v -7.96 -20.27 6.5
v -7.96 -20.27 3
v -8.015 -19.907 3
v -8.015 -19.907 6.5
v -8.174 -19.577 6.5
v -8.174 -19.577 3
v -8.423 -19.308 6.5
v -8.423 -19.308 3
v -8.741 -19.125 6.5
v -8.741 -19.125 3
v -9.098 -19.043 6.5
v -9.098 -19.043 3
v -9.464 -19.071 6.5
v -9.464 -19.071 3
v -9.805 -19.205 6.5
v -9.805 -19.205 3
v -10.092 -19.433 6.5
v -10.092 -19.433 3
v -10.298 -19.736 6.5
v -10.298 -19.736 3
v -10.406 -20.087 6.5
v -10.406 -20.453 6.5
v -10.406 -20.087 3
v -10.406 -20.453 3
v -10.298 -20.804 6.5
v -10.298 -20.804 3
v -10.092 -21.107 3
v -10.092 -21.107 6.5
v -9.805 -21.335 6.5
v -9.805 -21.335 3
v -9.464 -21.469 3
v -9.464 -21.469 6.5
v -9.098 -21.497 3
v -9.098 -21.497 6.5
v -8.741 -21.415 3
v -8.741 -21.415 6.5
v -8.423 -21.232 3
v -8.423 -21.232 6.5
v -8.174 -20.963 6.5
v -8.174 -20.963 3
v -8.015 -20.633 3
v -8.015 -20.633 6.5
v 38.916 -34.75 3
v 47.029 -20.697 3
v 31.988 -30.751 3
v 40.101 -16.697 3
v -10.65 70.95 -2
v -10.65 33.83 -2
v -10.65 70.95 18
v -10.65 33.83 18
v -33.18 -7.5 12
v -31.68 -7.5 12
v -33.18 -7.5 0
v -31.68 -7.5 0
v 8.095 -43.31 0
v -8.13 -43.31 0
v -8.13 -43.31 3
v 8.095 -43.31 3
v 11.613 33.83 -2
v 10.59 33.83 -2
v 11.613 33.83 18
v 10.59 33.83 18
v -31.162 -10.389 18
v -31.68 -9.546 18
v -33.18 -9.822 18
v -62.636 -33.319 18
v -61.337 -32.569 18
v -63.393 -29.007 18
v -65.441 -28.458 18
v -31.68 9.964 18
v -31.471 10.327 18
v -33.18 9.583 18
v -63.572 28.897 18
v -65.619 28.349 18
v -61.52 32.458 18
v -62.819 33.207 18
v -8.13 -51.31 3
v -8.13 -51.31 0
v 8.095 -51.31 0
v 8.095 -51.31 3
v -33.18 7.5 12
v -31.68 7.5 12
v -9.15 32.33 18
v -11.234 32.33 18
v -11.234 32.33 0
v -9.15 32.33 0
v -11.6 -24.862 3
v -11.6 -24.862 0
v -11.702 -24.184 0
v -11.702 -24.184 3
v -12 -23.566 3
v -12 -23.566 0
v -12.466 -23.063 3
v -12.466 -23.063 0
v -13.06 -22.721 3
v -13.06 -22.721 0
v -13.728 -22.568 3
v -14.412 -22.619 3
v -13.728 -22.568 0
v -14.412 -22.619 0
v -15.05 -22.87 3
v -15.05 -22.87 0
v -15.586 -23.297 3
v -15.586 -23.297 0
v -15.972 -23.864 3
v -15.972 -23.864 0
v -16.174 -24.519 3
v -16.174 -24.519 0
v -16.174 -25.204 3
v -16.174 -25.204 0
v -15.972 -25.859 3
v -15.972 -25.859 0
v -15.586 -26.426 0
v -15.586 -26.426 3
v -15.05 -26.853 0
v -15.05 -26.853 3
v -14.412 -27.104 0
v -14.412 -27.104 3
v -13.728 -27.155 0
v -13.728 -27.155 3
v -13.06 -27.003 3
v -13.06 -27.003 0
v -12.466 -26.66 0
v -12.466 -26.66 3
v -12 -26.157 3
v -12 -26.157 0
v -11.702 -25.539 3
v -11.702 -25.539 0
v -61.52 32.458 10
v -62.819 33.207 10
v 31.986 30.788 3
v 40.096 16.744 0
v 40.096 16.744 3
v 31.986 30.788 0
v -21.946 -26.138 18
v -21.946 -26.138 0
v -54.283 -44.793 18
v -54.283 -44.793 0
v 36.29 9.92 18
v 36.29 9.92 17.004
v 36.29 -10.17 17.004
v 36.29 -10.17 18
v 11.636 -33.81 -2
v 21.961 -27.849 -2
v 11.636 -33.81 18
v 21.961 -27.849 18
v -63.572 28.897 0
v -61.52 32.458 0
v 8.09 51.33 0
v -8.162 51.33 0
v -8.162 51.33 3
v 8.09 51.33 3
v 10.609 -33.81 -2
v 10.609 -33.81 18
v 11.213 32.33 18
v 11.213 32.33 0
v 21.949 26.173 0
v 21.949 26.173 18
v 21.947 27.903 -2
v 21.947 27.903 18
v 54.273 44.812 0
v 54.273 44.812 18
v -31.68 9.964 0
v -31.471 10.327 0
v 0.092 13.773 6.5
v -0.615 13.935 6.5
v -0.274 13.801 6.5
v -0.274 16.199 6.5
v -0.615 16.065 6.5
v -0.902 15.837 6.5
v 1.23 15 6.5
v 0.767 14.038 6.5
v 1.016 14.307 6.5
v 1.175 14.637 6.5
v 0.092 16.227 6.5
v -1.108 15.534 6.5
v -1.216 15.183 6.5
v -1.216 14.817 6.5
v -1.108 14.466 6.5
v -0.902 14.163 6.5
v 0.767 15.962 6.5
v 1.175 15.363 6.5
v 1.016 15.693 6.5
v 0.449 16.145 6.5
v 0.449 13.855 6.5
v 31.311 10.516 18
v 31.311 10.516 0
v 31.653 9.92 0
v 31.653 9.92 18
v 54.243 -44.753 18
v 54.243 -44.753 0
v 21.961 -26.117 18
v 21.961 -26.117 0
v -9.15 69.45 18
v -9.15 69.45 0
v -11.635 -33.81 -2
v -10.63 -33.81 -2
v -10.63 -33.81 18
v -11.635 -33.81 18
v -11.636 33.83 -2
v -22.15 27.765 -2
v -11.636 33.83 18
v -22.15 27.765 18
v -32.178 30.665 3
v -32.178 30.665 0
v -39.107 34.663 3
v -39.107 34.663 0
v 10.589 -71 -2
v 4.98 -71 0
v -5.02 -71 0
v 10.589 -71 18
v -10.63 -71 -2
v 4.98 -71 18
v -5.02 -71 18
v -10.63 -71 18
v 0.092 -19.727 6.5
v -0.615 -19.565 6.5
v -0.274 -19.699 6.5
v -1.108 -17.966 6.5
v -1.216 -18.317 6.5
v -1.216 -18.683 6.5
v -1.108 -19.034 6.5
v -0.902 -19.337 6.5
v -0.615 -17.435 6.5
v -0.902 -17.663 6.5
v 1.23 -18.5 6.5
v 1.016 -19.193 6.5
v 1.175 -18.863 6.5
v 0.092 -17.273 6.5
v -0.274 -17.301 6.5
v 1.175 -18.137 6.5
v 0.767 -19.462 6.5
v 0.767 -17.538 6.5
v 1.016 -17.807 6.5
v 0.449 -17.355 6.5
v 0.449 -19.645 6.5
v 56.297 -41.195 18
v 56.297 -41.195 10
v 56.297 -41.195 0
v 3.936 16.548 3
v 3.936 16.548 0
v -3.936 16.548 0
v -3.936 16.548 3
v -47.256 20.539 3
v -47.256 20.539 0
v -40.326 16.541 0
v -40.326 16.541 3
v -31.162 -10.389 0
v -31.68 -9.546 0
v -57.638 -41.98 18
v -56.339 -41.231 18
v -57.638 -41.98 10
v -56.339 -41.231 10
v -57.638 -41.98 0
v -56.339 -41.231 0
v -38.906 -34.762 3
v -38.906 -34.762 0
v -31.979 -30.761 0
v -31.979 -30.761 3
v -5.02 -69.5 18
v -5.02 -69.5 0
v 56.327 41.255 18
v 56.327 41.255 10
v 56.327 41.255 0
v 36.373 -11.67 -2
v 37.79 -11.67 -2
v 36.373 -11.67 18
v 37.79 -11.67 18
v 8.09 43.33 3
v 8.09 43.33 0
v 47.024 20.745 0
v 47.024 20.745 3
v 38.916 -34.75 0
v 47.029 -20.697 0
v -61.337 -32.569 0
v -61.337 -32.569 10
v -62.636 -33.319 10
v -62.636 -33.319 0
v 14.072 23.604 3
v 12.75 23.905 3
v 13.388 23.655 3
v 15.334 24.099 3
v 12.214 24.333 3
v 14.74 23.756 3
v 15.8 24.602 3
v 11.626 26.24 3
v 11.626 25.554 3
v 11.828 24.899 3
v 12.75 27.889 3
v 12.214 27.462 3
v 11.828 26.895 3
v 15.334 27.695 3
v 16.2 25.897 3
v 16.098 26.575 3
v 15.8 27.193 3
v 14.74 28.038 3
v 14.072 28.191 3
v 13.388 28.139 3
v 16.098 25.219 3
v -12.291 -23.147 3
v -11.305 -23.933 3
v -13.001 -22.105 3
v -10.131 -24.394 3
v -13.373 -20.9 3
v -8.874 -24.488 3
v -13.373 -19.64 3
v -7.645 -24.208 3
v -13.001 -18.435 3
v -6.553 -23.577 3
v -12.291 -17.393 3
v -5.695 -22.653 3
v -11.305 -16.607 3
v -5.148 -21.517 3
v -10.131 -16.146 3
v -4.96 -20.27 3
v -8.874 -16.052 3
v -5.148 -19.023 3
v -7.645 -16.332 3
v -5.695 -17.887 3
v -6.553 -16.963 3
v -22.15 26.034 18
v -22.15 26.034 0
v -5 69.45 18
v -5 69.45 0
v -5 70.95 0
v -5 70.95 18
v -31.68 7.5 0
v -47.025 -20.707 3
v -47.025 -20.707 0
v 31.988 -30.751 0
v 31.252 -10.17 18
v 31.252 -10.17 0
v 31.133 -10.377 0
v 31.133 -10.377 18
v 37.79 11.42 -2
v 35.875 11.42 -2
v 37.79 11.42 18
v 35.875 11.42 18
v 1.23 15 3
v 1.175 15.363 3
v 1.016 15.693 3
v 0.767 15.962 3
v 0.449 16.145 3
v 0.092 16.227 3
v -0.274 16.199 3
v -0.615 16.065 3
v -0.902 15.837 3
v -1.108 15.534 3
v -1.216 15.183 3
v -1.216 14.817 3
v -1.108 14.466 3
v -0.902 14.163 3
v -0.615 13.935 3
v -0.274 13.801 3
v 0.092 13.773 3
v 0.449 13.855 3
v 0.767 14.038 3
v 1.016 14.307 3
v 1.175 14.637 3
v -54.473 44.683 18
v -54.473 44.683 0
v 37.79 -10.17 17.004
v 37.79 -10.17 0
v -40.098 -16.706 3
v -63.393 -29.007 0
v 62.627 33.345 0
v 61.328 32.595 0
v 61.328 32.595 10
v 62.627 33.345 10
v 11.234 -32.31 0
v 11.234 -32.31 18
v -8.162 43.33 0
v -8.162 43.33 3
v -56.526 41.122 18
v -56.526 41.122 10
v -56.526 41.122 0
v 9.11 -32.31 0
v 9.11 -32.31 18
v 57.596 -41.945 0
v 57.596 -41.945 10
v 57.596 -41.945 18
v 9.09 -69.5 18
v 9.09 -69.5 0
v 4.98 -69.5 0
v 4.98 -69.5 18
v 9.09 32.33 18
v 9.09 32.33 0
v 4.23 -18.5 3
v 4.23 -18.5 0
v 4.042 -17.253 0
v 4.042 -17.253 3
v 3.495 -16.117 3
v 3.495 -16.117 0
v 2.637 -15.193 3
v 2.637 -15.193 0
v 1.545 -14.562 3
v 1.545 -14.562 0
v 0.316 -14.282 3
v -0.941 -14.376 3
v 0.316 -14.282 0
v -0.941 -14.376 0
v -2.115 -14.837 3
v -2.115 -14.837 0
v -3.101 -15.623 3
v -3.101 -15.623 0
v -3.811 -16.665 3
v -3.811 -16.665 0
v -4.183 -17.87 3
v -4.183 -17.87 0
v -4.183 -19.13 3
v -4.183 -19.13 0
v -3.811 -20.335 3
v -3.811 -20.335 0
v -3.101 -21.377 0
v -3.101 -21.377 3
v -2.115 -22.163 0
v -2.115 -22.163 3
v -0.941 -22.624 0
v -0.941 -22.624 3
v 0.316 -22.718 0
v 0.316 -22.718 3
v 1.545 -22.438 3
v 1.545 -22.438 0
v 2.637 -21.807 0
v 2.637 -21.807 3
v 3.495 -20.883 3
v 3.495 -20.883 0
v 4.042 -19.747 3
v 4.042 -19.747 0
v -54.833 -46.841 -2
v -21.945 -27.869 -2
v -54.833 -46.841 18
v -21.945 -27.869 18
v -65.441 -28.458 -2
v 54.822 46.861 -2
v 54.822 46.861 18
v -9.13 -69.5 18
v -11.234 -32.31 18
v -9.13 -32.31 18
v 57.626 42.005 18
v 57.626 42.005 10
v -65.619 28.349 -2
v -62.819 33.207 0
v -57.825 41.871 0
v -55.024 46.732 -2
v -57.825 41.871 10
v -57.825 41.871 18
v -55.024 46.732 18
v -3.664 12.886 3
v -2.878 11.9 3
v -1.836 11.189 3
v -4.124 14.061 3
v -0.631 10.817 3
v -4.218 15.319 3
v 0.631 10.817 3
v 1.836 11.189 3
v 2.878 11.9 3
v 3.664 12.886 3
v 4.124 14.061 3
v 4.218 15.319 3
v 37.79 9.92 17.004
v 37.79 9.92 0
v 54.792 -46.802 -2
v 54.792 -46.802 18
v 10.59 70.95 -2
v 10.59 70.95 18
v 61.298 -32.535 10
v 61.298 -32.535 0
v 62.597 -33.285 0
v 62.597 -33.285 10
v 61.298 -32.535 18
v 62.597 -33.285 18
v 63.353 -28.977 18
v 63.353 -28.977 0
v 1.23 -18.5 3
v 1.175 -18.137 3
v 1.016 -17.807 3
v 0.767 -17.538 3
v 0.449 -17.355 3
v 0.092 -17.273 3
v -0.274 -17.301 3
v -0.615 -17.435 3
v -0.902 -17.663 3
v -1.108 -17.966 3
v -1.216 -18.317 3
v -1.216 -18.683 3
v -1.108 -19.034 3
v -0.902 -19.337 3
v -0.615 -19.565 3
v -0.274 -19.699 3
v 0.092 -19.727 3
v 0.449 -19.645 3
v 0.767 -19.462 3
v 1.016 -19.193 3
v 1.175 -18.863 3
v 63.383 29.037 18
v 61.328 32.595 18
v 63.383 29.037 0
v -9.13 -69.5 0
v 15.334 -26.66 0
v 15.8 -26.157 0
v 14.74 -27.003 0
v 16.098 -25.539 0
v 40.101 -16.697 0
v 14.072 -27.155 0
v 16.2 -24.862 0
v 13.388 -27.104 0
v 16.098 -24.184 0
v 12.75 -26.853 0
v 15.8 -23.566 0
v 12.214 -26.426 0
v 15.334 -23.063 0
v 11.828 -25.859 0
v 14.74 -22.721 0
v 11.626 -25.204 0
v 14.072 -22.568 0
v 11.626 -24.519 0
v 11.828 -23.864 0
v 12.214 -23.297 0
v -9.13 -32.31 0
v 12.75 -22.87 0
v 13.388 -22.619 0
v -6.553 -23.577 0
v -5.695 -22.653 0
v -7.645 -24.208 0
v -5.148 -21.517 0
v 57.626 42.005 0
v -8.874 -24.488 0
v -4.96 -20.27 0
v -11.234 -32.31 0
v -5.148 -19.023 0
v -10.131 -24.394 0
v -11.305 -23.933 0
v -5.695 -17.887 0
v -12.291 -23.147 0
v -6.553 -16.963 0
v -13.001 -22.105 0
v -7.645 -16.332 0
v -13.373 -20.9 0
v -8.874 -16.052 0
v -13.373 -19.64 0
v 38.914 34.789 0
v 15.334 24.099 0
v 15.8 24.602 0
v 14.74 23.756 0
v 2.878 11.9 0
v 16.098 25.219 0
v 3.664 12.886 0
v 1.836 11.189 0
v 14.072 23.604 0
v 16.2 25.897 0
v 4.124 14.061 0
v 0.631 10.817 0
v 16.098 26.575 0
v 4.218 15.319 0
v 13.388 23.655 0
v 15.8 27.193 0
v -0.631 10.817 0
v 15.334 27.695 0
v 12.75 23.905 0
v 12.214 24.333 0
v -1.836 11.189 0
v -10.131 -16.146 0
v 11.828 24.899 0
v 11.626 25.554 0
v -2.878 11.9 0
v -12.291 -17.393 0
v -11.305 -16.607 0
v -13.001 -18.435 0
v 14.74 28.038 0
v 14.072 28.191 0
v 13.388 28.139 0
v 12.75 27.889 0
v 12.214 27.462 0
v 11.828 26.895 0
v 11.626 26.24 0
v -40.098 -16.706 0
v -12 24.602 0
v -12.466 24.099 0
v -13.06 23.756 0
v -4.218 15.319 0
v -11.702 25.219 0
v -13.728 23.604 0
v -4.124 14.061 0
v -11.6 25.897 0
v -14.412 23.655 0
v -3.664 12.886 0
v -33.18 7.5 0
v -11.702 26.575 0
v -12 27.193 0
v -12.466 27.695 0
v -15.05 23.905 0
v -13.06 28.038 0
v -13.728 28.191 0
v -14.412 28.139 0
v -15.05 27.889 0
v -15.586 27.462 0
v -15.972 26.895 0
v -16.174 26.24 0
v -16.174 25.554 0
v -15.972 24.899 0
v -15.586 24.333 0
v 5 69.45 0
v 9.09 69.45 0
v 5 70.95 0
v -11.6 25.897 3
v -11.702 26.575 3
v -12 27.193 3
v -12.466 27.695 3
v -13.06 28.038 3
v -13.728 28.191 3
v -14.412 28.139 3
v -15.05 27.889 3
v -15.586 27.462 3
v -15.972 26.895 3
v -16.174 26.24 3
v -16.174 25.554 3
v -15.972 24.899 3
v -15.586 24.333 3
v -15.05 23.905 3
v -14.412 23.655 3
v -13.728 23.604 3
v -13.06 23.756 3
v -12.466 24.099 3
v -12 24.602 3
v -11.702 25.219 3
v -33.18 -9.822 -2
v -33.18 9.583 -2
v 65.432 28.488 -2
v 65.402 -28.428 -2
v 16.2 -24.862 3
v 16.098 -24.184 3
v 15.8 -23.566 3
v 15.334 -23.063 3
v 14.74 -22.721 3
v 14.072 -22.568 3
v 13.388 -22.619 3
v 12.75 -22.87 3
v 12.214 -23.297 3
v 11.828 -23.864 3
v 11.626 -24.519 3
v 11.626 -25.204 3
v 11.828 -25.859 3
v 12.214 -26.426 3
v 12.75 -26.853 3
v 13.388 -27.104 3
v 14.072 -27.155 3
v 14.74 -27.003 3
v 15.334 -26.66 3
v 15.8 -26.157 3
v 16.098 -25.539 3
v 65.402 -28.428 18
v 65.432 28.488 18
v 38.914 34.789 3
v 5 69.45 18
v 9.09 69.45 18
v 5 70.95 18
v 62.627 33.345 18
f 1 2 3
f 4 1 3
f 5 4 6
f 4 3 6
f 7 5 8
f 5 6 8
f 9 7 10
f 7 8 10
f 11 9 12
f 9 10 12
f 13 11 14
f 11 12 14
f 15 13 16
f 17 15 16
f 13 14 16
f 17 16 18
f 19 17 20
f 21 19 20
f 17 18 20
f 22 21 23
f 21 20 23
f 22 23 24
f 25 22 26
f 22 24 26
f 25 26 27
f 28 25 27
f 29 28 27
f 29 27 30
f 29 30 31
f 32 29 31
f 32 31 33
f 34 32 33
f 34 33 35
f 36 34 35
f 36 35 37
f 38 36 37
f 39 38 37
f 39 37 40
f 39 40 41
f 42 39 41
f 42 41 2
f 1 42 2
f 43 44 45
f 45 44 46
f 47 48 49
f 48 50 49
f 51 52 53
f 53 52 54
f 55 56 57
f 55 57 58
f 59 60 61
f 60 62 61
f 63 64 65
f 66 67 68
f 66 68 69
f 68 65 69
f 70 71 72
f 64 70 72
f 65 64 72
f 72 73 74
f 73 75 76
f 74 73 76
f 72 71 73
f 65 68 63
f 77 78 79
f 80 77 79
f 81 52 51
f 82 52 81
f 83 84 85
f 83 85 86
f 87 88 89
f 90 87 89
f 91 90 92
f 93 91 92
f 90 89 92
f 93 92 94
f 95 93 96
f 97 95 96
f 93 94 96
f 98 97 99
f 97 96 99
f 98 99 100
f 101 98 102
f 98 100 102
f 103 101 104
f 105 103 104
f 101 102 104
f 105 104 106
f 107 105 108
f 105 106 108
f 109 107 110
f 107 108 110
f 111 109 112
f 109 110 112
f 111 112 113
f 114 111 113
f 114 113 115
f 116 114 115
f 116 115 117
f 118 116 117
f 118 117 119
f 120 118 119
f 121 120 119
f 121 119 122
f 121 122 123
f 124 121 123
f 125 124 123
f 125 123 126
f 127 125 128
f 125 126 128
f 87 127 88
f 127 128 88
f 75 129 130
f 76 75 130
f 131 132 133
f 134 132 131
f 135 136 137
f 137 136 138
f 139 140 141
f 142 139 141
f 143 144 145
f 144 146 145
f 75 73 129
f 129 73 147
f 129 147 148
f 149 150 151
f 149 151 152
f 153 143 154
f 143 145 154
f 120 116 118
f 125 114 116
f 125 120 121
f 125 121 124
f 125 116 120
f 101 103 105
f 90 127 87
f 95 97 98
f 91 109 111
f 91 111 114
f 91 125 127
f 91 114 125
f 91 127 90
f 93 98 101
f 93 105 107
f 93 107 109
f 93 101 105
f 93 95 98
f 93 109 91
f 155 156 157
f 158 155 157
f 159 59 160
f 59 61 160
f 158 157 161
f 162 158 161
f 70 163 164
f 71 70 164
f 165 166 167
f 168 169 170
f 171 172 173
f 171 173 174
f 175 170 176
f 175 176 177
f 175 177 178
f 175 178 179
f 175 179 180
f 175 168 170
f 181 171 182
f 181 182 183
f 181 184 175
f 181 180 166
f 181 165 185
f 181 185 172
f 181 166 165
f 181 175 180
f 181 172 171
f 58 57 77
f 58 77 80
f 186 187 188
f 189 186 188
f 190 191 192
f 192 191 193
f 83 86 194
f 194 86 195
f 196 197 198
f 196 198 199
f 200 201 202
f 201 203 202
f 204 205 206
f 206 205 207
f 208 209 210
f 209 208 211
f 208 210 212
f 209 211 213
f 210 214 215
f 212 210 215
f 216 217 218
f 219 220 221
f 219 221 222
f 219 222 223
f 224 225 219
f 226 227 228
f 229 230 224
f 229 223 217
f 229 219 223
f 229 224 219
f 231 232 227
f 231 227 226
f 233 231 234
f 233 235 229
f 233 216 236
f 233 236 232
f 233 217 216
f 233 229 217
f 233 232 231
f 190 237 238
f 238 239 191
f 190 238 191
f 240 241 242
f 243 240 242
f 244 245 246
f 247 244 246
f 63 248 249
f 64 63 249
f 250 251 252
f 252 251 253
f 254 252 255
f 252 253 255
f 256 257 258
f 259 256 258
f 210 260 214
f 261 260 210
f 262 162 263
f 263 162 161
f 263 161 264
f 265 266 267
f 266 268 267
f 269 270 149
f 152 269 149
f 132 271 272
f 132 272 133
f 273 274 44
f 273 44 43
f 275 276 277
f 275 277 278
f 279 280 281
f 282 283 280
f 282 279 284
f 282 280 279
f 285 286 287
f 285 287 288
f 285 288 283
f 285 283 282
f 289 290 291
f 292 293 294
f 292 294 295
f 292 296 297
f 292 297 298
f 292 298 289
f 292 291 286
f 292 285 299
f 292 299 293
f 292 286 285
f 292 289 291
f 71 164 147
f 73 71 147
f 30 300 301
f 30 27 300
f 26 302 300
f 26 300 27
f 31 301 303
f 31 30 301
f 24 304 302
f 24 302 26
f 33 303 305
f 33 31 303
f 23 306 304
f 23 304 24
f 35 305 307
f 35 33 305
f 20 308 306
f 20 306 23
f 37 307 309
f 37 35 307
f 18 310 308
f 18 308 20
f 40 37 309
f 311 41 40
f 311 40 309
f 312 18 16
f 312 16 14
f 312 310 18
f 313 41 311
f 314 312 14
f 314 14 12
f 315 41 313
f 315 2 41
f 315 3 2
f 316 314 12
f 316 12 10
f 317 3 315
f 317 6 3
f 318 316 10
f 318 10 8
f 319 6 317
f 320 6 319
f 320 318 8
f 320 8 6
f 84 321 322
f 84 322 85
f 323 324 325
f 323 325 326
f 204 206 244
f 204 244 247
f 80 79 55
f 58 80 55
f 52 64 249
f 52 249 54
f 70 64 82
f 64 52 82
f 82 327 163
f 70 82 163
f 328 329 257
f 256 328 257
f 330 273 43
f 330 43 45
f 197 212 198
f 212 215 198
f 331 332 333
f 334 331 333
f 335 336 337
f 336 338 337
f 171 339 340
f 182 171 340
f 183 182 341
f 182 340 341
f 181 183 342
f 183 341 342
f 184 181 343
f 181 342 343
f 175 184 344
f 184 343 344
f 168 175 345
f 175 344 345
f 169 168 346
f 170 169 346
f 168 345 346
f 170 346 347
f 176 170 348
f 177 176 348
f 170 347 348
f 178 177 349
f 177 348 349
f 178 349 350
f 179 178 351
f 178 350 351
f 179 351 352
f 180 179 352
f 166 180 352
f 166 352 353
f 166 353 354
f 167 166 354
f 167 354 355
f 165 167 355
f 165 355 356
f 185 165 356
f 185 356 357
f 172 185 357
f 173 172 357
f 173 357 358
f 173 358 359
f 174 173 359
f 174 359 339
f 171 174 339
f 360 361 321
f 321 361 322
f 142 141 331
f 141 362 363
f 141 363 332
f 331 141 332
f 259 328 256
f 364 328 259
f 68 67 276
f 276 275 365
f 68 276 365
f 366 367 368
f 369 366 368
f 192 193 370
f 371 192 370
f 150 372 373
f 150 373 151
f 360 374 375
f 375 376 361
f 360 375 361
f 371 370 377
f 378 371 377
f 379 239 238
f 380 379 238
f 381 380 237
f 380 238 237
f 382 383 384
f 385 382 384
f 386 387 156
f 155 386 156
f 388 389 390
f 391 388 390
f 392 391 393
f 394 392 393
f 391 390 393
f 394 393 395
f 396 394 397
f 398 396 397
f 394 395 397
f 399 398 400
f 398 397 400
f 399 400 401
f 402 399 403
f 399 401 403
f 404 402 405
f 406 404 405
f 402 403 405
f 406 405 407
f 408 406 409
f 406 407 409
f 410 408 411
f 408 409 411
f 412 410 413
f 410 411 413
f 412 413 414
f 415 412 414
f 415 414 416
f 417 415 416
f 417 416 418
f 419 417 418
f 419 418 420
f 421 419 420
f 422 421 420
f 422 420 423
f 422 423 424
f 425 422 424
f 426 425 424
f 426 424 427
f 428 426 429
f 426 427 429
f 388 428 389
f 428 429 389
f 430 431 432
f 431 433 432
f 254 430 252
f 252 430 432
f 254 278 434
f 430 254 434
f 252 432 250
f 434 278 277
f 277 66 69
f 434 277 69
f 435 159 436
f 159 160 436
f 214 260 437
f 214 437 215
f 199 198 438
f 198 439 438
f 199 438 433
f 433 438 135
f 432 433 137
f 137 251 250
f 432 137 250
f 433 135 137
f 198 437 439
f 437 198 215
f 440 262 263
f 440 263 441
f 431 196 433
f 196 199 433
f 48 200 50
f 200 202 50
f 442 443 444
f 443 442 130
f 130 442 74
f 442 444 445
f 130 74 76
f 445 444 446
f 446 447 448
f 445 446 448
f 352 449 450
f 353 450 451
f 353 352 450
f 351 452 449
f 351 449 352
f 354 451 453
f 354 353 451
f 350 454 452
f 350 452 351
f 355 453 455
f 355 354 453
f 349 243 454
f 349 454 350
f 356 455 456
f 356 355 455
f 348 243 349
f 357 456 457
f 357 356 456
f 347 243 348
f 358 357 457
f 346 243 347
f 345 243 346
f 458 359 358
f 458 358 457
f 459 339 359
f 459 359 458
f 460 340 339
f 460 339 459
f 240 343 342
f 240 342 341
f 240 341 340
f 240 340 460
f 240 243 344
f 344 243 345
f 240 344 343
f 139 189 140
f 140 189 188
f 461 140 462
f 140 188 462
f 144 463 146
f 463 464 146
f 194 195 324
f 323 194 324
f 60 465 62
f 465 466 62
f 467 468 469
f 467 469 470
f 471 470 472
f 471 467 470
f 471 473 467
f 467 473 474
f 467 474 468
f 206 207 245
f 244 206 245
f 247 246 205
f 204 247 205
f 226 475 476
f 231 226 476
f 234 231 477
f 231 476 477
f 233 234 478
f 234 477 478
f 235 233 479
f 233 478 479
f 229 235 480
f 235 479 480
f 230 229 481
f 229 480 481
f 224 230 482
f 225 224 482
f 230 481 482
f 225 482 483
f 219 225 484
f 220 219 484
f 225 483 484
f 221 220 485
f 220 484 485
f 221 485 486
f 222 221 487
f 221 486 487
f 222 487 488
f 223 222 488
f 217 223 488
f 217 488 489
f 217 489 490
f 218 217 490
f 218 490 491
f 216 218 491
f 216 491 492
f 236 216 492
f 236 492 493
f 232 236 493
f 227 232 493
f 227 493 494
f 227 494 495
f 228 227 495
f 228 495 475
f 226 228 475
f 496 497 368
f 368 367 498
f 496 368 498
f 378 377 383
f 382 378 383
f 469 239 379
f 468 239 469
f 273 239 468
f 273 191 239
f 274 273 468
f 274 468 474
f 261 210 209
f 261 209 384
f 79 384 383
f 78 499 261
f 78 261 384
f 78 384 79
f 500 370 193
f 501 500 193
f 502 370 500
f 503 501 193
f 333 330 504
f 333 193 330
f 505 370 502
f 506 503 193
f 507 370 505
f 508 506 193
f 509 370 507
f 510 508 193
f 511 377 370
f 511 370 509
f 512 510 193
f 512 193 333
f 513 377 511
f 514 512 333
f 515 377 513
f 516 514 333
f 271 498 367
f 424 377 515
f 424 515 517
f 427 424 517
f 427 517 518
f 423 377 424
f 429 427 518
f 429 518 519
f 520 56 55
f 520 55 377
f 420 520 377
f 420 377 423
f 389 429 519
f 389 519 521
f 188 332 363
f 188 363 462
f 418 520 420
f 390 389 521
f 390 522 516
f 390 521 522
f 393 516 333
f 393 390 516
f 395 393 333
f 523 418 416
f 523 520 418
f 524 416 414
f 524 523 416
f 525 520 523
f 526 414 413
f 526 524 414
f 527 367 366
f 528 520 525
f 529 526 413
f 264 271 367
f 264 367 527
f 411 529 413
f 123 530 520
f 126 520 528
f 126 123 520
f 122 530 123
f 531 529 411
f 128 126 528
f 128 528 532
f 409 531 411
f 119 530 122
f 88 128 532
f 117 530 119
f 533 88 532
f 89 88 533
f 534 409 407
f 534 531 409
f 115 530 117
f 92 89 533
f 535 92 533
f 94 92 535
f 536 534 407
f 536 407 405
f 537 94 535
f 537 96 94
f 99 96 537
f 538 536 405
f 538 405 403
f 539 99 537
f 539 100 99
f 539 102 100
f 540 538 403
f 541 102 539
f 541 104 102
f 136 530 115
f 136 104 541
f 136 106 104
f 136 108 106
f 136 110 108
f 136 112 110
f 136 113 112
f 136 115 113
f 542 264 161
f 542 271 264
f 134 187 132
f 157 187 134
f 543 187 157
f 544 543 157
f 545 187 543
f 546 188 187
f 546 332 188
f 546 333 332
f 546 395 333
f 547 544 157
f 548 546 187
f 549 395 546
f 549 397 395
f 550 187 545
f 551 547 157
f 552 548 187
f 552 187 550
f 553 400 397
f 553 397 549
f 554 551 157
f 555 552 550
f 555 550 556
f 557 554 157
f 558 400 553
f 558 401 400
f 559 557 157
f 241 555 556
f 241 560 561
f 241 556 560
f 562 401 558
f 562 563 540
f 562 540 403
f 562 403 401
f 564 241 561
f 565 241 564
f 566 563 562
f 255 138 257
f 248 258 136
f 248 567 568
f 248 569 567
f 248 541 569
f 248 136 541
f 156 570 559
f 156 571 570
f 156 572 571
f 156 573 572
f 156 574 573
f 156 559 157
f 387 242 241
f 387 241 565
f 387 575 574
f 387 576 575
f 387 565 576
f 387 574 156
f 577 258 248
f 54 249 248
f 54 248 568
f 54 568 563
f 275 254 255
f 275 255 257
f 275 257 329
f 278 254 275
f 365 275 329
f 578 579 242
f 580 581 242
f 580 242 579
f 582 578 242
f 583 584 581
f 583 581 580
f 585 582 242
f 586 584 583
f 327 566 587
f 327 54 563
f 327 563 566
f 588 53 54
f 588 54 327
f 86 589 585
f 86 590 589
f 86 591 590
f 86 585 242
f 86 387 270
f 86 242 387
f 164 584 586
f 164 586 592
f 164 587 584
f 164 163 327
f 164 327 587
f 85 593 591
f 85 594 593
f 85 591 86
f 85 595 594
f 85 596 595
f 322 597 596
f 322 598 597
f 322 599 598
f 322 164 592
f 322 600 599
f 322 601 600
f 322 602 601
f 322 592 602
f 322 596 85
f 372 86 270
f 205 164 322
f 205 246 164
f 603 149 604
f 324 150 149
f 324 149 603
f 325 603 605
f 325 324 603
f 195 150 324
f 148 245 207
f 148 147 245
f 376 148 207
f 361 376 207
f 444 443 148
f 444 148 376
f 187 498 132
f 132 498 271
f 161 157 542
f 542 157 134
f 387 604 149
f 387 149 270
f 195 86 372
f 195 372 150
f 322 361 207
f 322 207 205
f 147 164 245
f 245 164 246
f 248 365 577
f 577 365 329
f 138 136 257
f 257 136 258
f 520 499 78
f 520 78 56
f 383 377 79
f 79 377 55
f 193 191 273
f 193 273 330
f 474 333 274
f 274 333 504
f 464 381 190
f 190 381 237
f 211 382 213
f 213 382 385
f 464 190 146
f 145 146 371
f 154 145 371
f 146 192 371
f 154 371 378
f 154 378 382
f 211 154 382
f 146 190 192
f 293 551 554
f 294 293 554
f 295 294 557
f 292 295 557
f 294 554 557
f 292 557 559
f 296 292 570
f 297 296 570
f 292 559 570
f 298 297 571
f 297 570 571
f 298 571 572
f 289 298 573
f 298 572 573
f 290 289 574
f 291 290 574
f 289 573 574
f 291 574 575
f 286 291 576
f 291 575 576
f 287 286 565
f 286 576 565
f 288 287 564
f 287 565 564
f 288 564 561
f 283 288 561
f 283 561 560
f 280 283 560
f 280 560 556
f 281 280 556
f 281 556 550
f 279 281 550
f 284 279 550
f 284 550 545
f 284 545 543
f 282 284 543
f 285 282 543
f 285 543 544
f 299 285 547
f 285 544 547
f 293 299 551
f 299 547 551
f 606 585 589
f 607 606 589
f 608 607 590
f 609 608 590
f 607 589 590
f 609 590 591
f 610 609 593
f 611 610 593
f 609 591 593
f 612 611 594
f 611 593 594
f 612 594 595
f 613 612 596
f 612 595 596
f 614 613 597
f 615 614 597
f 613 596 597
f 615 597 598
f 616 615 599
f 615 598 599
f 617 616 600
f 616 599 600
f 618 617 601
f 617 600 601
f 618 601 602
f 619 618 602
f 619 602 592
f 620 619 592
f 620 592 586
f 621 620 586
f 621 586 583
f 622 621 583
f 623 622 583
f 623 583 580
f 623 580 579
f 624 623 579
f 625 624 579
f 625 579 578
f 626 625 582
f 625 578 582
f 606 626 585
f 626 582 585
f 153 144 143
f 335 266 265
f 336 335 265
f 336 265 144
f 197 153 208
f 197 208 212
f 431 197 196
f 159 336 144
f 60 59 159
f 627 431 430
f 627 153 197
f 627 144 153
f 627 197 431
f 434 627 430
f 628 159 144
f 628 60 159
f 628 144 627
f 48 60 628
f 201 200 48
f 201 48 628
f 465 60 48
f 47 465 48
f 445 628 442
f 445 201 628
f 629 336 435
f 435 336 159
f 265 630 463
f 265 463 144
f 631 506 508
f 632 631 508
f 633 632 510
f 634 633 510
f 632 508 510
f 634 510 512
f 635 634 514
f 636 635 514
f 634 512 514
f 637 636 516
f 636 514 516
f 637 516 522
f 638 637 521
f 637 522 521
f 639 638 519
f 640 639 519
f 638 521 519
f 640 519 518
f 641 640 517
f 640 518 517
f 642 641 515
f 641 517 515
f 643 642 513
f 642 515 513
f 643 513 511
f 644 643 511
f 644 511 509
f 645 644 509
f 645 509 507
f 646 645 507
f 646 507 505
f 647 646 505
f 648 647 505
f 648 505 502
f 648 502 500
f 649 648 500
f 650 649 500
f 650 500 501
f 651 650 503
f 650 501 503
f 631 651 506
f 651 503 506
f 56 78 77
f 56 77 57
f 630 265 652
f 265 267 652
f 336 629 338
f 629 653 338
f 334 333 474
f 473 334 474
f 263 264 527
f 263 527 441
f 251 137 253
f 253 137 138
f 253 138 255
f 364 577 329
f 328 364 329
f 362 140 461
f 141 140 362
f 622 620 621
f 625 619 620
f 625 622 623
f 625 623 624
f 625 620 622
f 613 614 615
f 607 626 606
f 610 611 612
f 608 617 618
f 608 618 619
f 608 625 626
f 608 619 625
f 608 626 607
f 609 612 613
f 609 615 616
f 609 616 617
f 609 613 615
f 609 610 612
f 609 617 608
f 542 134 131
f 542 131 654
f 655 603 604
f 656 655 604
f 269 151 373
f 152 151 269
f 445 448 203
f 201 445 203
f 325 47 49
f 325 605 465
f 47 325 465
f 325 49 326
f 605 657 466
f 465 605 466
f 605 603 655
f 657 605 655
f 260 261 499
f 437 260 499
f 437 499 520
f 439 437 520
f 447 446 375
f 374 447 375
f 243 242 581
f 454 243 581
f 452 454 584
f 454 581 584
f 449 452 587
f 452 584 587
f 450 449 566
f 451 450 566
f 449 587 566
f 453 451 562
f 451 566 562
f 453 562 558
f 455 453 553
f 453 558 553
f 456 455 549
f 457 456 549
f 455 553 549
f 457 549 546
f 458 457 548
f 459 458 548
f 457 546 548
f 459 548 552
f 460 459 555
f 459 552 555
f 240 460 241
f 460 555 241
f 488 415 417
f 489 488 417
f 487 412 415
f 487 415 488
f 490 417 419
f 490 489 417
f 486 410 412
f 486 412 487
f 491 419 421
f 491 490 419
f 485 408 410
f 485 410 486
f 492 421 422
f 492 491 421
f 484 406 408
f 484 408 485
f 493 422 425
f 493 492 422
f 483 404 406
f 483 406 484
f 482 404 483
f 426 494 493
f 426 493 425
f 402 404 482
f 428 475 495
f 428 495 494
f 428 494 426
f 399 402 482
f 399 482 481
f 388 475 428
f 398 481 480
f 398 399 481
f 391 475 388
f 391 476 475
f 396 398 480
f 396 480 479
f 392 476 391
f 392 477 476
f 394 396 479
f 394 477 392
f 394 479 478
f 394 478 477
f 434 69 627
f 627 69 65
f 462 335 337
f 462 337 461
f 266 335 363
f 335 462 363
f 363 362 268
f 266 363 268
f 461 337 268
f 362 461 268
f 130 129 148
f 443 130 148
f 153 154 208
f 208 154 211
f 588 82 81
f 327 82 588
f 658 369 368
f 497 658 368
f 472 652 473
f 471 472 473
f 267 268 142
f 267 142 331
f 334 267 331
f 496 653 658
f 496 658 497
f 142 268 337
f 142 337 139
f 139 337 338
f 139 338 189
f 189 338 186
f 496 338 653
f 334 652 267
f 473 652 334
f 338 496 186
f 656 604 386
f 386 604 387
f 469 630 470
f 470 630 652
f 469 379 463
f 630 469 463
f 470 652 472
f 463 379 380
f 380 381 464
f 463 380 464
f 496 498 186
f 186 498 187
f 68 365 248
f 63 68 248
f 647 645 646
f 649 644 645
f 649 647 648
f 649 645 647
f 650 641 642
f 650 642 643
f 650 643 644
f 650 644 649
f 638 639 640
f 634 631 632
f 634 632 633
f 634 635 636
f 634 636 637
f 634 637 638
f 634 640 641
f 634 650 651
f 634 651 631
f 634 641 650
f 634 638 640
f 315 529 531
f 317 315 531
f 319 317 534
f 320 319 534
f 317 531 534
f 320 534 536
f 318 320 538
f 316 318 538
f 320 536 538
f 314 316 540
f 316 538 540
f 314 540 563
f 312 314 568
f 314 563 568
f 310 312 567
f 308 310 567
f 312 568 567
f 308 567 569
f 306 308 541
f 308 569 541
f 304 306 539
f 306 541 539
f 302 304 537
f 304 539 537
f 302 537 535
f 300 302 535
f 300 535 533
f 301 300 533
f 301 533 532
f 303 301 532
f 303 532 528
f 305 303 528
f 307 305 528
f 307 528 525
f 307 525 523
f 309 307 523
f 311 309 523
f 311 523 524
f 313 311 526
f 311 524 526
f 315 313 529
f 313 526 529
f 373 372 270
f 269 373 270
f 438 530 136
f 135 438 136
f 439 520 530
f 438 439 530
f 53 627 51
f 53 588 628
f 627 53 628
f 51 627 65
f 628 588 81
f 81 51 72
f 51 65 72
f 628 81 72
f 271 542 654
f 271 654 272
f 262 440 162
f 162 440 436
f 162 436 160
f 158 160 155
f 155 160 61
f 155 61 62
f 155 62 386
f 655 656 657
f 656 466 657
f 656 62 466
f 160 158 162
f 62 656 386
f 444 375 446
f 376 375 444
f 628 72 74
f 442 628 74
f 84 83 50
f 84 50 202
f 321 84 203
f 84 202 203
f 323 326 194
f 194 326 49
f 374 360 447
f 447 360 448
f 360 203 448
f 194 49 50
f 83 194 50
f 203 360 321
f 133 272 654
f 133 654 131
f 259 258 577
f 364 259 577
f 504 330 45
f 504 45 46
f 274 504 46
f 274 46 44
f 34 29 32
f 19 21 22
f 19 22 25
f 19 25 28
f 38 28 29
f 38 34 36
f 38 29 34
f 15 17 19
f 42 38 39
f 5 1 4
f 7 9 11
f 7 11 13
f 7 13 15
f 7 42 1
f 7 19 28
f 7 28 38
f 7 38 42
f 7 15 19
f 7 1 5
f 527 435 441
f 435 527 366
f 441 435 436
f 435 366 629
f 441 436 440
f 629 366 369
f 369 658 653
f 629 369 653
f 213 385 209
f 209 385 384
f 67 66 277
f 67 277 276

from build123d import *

# Parameters (mm, degrees)
AUFSATZ_LINEAR_AUSTRAGEN1_DEPTH = 18
AUFSATZ_LINEAR_AUSTRAGEN2_DEPTH = 2
SCHNITT_LINEAR_AUSTRAGEN1_REACH = 31.142
SCHNITT_LINEAR_AUSTRAGEN2_REACH = 35.939
SKIZZE5_W                       = 12
SKIZZE5_H                       = 15
SKIZZE7_R                       = 1.22999984
AUFSATZ_LINEAR_AUSTRAGEN3_DEPTH = 6.5
SKIZZE8_R                       = 4.22999984
SKIZZE8_R_2                     = 2.3
AUFSATZ_LINEAR_AUSTRAGEN4_DEPTH = 3
SKIZZE9_W                       = 16.252283896
SKIZZE9_H                       = 8
SKIZZE9_W_2                     = 16.225392475
AUFSATZ_LINEAR_AUSTRAGEN7_DEPTH = 3
SCHNITT_LINEAR_AUSTRAGEN3_REACH = 3.5
SKIZZE11_W                      = 10
SKIZZE11_H                      = 10
SCHNITT_LINEAR_AUSTRAGEN4_REACH = 24.734
SKIZZE13_W                      = 10
SKIZZE13_H                      = 10
SCHNITT_LINEAR_AUSTRAGEN5_REACH = 24.815
SKIZZE14_W                      = 10
SKIZZE14_H                      = 10
SCHNITT_LINEAR_AUSTRAGEN6_REACH = 3.5
SKIZZE15_W                      = 10
SKIZZE15_H                      = 10
SCHNITT_LINEAR_AUSTRAGEN7_REACH = 24.918
SKIZZE16_W                      = 10
SKIZZE16_H                      = 10
SCHNITT_LINEAR_AUSTRAGEN8_REACH = 24.774
SKIZZE17_W                      = 10
SKIZZE17_H                      = 10
SKIZZE18_W                      = 10
SKIZZE18_H                      = 1.5
SCHNITT_LINEAR_AUSTRAGEN9_DEPTH = 8


with BuildPart() as part:
    # Skizze1 → Aufsatz-Linear austragen1 (new body)
    with BuildSketch(Plane.XY):
        Polygon((-22.149859894, 27.765281808), (-11.635793215, 33.83000044), (-10.65000108, 33.83000044), (-10.65000108, 70.94999986), (10.5900012, 70.94999986), (10.5900012, 33.83000044), (11.612735063, 33.83000044), (21.946878227, 27.90320319), (54.822266278, 46.860690996), (65.431940836, 28.488460753), (35.875483821, 11.41999954), (37.79000014, 11.41999954), (37.79000014, -11.66999904), (36.372671479, -11.66999904), (65.402118422, -28.428154068), (54.791716349, -46.801638497), (21.961456264, -27.849347945), (11.636228403, -33.81000048), (10.608764603, -33.81000048), (10.588764643, -70.99999976), (-10.63000112, -70.99999976), (-10.63000112, -33.81000048), (-11.635211495, -33.81000048), (-21.94526311, -27.869445957), (-54.832668225, -46.841377939), (-65.441180026, -28.458395245), (-33.1799992, -9.82193495), (-33.1799992, 9.582671858), (-65.619428736, 28.349034811), (-55.023633975, 46.732102334), align=None)
        Polygon((-22.149950537, 26.033576659), (-11.234189479, 32.33000044), (-9.15000108, 32.33000044), (-9.15000108, 69.44999986), (9.0900012, 69.44999986), (9.0900012, 32.33000044), (11.2131258, 32.33000044), (21.948913697, 26.172853479), (54.272963006, 44.812413555), (63.382848908, 29.03729054), (31.311020441, 10.516235735), (31.653238716, 9.91999954), (36.29000014, 9.91999954), (36.29000014, -10.16999904), (31.252050971, -10.16999904), (31.132619329, -10.37701429), (63.352910716, -28.977183946), (54.242770108, -44.752743199), (21.961450411, -26.11734559), (11.234340849, -32.31000048), (9.109571053, -32.31000048), (9.089571093, -69.49999976), (-9.13000112, -69.49999976), (-9.13000112, -32.31000048), (-11.233987142, -32.31000048), (-21.945708018, -26.138007916), (-54.2831028, -44.792652518), (-63.392584266, -29.007267794), (-31.162137007, -10.388561496), (-31.6799992, -9.546253935), (-31.6799992, 9.963511331), (-31.471105622, 10.326986156), (-63.571974887, 28.897490395), (-54.473438465, 44.682904625), align=None, mode=Mode.SUBTRACT)
    extrude(amount=AUFSATZ_LINEAR_AUSTRAGEN1_DEPTH)

    # Skizze3 → Aufsatz-Linear austragen2 (add)
    with BuildSketch(Plane(origin=(0, 0, 0), x_dir=(-1, 0, 0), z_dir=(0, 0, -1))):
        Polygon((55.023633975, 46.732102334), (22.149859894, 27.765281808), (11.635793215, 33.83000044), (10.65000108, 33.83000044), (10.65000108, 70.94999986), (-10.5900012, 70.94999986), (-10.5900012, 33.83000044), (-11.612735063, 33.83000044), (-21.946878227, 27.90320319), (-54.822266278, 46.860690996), (-65.431940836, 28.488460753), (-35.875483821, 11.41999954), (-37.79000014, 11.41999954), (-37.79000014, -11.66999904), (-36.372671479, -11.66999904), (-65.402118422, -28.428154068), (-54.791716349, -46.801638497), (-21.961456264, -27.849347945), (-11.636228403, -33.81000048), (-10.608764603, -33.81000048), (-10.588764643, -70.99999976), (10.63000112, -70.99999976), (10.63000112, -33.81000048), (11.635211495, -33.81000048), (21.94526311, -27.869445957), (54.832668225, -46.841377939), (65.441180026, -28.458395245), (33.1799992, -9.82193495), (33.1799992, 9.582671858), (65.619428736, 28.349034811), align=None)
    extrude(amount=AUFSATZ_LINEAR_AUSTRAGEN2_DEPTH)

    # Skizze4 → Schnitt-Linear austragen1 (cut, up to next)
    with BuildSketch(Plane.ZY.offset(-36.29000014), mode=Mode.PRIVATE) as schnitt_linear_austragen1_sk1:
        Polygon((17.00382914, 9.91999954), (17.00382914, -10.16999904), (0.851260669, -10.16999904), (0, -10.16999904), (0, 9.91999954), (0.851260669, 9.91999954), align=None)
    schnitt_linear_austragen1_tool1 = extrude(schnitt_linear_austragen1_sk1.sketch, amount=-SCHNITT_LINEAR_AUSTRAGEN1_REACH, mode=Mode.PRIVATE) & part.part
    add(schnitt_linear_austragen1_tool1.solids().sort_by_distance((36.29, -0.125, 8.501915))[0], mode=Mode.SUBTRACT)

    # Skizze5 → Schnitt-Linear austragen2 (cut, up to next)
    with BuildSketch(Plane(origin=(-31.6799992, 0, 0), x_dir=(0, 0, -1), z_dir=(1, 0, 0)), mode=Mode.PRIVATE) as schnitt_linear_austragen2_sk1:
        with Locations((-6, 0)):
            Rectangle(SKIZZE5_W, SKIZZE5_H)
    schnitt_linear_austragen2_tool1 = extrude(schnitt_linear_austragen2_sk1.sketch, amount=-SCHNITT_LINEAR_AUSTRAGEN2_REACH, mode=Mode.PRIVATE) & part.part
    add(schnitt_linear_austragen2_tool1.solids().sort_by_distance((-31.679999, 0, 6))[0], mode=Mode.SUBTRACT)

    # Skizze7 → Aufsatz-Linear austragen3 (add)
    with BuildSketch(Plane.XY):
        with Locations((0, 15.00000048)):
            Circle(SKIZZE7_R)
        with Locations((0, -18.5000011)):
            Circle(SKIZZE7_R)
        with Locations((-9.1899994, -20.2700001)):
            Circle(SKIZZE7_R)
    extrude(amount=AUFSATZ_LINEAR_AUSTRAGEN3_DEPTH)

    # Skizze8 → Aufsatz-Linear austragen4 (add)
    with BuildSketch(Plane.XY):
        with Locations((-9.1899994, -20.2700001)):
            Circle(SKIZZE8_R)
        with Locations((0, -18.5000011)):
            Circle(SKIZZE8_R)
        with Locations((13.9, 25.897140228)):
            Circle(SKIZZE8_R_2)
        with Locations((-13.9, 25.897140228)):
            Circle(SKIZZE8_R_2)
        with Locations((13.9, -24.8615628)):
            Circle(SKIZZE8_R_2)
        with Locations((-13.9, -24.8615628)):
            Circle(SKIZZE8_R_2)
        with BuildLine():
            Line((3.936452455, 16.548303007), (-3.936452455, 16.548303007))
            ThreePointArc((-3.936452455, 16.548303007), (0, 10.77000064), (3.936452455, 16.548303007))
        make_face()
    extrude(amount=AUFSATZ_LINEAR_AUSTRAGEN4_DEPTH)

    # Skizze9 → Aufsatz-Linear austragen7 (add)
    with BuildSketch(Plane.XY):
        Polygon((-39.106966425, 34.662574989), (-47.255864546, 20.538698219), (-40.326487672, 16.540731718), (-32.177589551, 30.664608488), align=None)
        with Locations((-0.036140748, 47.33000044)):
            Rectangle(SKIZZE9_W, SKIZZE9_H)
        Polygon((40.096213315, 16.744336658), (31.986065924, 30.788205039), (38.913859811, 34.78891396), (47.024007202, 20.745045579), align=None)
        Polygon((40.10078632, -16.697308213), (47.029196881, -20.696949084), (38.916380603, -34.750441337), (31.987970041, -30.750800466), align=None)
        with Locations((-0.017304883, -47.31000048)):
            Rectangle(SKIZZE9_W_2, SKIZZE9_H)
        Polygon((-38.906027405, -34.762365837), (-31.978796823, -30.760681634), (-40.098111463, -16.705508406), (-47.025342045, -20.70719261), align=None)
    extrude(amount=AUFSATZ_LINEAR_AUSTRAGEN7_DEPTH)

    # Skizze11 → Schnitt-Linear austragen3 (cut, up to next)
    with BuildSketch(Plane.XZ.offset(-69.44999986), mode=Mode.PRIVATE) as schnitt_linear_austragen3_sk1:
        with Locations((0, 5)):
            Rectangle(SKIZZE11_W, SKIZZE11_H)
    schnitt_linear_austragen3_tool1 = extrude(schnitt_linear_austragen3_sk1.sketch, amount=-SCHNITT_LINEAR_AUSTRAGEN3_REACH, mode=Mode.PRIVATE) & part.part
    add(schnitt_linear_austragen3_tool1.solids().sort_by_distance((0, 69.45, 5))[0], mode=Mode.SUBTRACT)

    # Skizze13 → Schnitt-Linear austragen4 (cut, up to next)
    with BuildSketch(Plane(origin=(60.106593545, 34.710614216, 0), x_dir=(0, 0, 1), z_dir=(-0.86597514, -0.500087049, 0)), mode=Mode.PRIVATE) as schnitt_linear_austragen4_sk1:
        with Locations((5, 2.556930019)):
            Rectangle(SKIZZE13_W, SKIZZE13_H)
    schnitt_linear_austragen4_tool1 = extrude(schnitt_linear_austragen4_sk1.sketch, amount=-SCHNITT_LINEAR_AUSTRAGEN4_REACH, mode=Mode.PRIVATE) & part.part
    add(schnitt_linear_austragen4_tool1.solids().sort_by_distance((58.827906, 36.924852, 5))[0], mode=Mode.SUBTRACT)

    # Skizze14 → Schnitt-Linear austragen5 (cut, up to next)
    with BuildSketch(Plane(origin=(60.058107222, -34.682624727, 0), x_dir=(0, 0, 1), z_dir=(-0.865975074, 0.500087164, 0)), mode=Mode.PRIVATE) as schnitt_linear_austragen5_sk1:
        with Locations((5, -2.520094297)):
            Rectangle(SKIZZE14_W, SKIZZE14_H)
    schnitt_linear_austragen5_tool1 = extrude(schnitt_linear_austragen5_sk1.sketch, amount=-SCHNITT_LINEAR_AUSTRAGEN5_REACH, mode=Mode.PRIVATE) & part.part
    add(schnitt_linear_austragen5_tool1.solids().sort_by_distance((58.79784, -36.864964, 5))[0], mode=Mode.SUBTRACT)

    # Skizze15 → Schnitt-Linear austragen6 (cut, up to next)
    with BuildSketch(Plane(origin=(0, -69.49999976, 0), x_dir=(1, 0, 0), z_dir=(0, 1, 0)), mode=Mode.PRIVATE) as schnitt_linear_austragen6_sk1:
        with Locations((-0.020215013, -5)):
            Rectangle(SKIZZE15_W, SKIZZE15_H)
    schnitt_linear_austragen6_tool1 = extrude(schnitt_linear_austragen6_sk1.sketch, amount=-SCHNITT_LINEAR_AUSTRAGEN6_REACH, mode=Mode.PRIVATE) & part.part
    add(schnitt_linear_austragen6_tool1.solids().sort_by_distance((-0.020215, -69.5, 5))[0], mode=Mode.SUBTRACT)

    # Skizze16 → Schnitt-Linear austragen7 (cut, up to next)
    with BuildSketch(Plane(origin=(-60.113041463, -34.690230655, 0), x_dir=(0, 0, -1), z_dir=(0.866125522, 0.49982655, 0)), mode=Mode.PRIVATE) as schnitt_linear_austragen7_sk1:
        with Locations((-5, -2.551280899)):
            Rectangle(SKIZZE16_W, SKIZZE16_H)
    schnitt_linear_austragen7_tool1 = extrude(schnitt_linear_austragen7_sk1.sketch, amount=-SCHNITT_LINEAR_AUSTRAGEN7_REACH, mode=Mode.PRIVATE) & part.part
    add(schnitt_linear_austragen7_tool1.solids().sort_by_distance((-58.837844, -36.89996, 5))[0], mode=Mode.SUBTRACT)

    # Skizze17 → Schnitt-Linear austragen8 (cut, up to next)
    with BuildSketch(Plane(origin=(-60.221224503, 34.710841064, 0), x_dir=(0, 0, -1), z_dir=(0.866385869, -0.499375136, 0)), mode=Mode.PRIVATE) as schnitt_linear_austragen8_sk1:
        with Locations((-5, 2.400035044)):
            Rectangle(SKIZZE17_W, SKIZZE17_H)
    schnitt_linear_austragen8_tool1 = extrude(schnitt_linear_austragen8_sk1.sketch, amount=-SCHNITT_LINEAR_AUSTRAGEN8_REACH, mode=Mode.PRIVATE) & part.part
    add(schnitt_linear_austragen8_tool1.solids().sort_by_distance((-59.022707, 36.790198, 5))[0], mode=Mode.SUBTRACT)

    # Skizze18 → Schnitt-Linear austragen9 (cut)
    with BuildSketch(Plane(origin=(0, 0, 10), x_dir=(-1, 0, 0), z_dir=(0, 0, -1))):
        Polygon((-62.597238843, -33.285218949), (-57.596367204, -41.944969687), (-56.297404593, -41.194838941), (-61.298276232, -32.535088203), align=None)
        with Locations((0.020215013, -70.24999976)):
            Rectangle(SKIZZE18_W, SKIZZE18_H)
        Polygon((57.637899065, -41.980327591), (62.636164566, -33.319072372), (61.336976284, -32.569332546), (56.338710782, -41.230587766), align=None)
        Polygon((62.81916116, 33.207330871), (57.825409798, 41.871189557), (56.525830995, 41.122126853), (61.519582357, 32.458268167), align=None)
        with Locations((0, 70.19999986)):
            Rectangle(SKIZZE18_W, SKIZZE18_H)
        Polygon((-57.626433421, 42.004858322), (-62.627303913, 33.345106921), (-61.328341203, 32.594976347), (-56.327470711, 41.254727748), align=None)
    extrude(amount=-SCHNITT_LINEAR_AUSTRAGEN9_DEPTH, mode=Mode.SUBTRACT)


solid = part.part
